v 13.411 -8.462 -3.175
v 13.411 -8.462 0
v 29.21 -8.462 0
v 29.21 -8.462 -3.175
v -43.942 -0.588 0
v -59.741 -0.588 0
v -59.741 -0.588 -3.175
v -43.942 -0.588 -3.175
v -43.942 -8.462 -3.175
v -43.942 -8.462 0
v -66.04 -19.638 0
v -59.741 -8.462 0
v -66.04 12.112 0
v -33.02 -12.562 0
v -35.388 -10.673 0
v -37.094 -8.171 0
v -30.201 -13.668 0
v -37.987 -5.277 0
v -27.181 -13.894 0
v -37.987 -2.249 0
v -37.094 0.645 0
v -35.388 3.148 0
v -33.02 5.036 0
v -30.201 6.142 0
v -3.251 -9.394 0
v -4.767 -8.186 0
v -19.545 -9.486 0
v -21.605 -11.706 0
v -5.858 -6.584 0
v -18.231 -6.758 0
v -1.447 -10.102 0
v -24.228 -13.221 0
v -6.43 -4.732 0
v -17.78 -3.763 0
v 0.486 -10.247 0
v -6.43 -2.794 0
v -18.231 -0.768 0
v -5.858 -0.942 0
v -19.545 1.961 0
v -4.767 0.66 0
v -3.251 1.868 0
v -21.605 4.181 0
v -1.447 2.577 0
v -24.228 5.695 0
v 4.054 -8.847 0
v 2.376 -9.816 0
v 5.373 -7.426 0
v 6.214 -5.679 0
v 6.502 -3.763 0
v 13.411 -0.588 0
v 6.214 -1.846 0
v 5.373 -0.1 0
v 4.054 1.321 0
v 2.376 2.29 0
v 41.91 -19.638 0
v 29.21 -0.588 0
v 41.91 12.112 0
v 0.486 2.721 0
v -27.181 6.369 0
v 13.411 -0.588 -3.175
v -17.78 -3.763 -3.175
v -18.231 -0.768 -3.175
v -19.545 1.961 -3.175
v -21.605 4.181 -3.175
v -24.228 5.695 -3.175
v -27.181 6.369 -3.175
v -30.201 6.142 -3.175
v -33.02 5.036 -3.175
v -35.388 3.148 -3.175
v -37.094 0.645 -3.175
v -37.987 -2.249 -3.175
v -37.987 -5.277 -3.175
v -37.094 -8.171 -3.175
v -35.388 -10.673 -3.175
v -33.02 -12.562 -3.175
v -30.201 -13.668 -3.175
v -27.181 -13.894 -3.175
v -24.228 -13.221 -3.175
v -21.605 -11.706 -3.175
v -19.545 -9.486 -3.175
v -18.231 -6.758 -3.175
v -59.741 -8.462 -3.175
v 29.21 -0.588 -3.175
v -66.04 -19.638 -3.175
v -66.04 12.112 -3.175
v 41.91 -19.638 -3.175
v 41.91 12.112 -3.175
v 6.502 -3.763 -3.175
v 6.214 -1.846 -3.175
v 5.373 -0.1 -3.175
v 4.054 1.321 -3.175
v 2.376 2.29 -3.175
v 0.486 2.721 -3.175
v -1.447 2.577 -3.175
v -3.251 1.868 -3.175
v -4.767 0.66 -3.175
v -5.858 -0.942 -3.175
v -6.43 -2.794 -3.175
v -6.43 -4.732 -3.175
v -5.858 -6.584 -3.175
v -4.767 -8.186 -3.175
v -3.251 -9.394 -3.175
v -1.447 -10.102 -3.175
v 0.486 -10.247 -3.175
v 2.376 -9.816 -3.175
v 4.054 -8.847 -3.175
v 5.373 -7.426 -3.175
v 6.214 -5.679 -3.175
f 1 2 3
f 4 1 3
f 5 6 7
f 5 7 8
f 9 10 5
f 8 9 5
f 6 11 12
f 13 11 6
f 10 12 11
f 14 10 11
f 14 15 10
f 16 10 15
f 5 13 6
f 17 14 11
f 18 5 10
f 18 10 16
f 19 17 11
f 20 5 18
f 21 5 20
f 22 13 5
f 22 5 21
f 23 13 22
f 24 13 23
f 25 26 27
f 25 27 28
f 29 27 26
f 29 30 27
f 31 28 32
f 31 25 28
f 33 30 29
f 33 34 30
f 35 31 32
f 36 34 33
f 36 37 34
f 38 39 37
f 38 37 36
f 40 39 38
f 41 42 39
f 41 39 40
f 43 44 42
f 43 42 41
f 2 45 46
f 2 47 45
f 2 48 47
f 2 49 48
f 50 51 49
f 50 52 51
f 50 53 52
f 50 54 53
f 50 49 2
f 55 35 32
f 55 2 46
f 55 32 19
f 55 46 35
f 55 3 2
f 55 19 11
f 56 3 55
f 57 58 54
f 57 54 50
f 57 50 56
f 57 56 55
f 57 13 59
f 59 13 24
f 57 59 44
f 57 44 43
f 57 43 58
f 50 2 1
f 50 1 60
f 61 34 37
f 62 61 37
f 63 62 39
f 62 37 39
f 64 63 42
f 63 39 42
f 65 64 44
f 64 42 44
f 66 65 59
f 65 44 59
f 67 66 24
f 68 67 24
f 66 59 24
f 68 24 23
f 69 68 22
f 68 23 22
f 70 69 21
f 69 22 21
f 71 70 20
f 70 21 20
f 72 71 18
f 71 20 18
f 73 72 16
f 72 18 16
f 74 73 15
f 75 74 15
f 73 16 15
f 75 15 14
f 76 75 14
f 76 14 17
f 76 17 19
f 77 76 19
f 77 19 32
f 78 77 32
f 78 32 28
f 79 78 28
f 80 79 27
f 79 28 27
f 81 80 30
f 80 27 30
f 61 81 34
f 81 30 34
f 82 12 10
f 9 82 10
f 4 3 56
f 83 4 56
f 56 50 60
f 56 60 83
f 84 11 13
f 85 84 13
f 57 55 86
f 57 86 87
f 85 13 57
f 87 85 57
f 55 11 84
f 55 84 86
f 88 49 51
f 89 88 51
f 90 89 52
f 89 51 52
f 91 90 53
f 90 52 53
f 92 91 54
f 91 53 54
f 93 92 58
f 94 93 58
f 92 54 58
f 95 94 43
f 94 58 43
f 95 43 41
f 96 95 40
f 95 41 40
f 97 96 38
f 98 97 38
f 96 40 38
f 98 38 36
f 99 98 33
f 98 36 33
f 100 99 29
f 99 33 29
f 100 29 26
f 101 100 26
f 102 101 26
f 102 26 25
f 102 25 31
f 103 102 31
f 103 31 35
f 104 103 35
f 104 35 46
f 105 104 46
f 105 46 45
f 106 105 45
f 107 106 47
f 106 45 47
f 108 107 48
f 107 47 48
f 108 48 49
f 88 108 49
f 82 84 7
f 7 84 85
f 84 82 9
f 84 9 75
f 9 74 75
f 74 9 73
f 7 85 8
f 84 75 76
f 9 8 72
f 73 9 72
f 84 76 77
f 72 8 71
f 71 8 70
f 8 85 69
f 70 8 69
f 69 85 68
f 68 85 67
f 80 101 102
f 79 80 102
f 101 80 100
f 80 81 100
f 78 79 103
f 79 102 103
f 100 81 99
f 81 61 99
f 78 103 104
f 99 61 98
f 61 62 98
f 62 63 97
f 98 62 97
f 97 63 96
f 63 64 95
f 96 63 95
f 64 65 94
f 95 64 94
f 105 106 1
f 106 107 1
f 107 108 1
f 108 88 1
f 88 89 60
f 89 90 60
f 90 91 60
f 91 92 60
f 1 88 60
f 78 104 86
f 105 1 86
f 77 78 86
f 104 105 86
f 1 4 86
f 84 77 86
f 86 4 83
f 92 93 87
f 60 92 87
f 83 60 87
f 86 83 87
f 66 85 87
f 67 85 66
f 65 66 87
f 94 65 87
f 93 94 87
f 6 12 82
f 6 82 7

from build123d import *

# Parameters (mm, degrees)
F0_W     = 107.95
F0_H     = 31.75
F0_W_2   = 15.7988
F0_H_2   = 7.874
F0_R     = 10.16
F0_R_2   = 6.5024
F1_DEPTH = 3.175


with BuildPart() as f1:
    # F0 (on Top) → F1 (new body)
    with BuildSketch(Plane.XY):
        with Locations((-12.065, -3.762827)):
            Rectangle(F0_W, F0_H)
        with Locations((-51.8414, -4.524827)):
            Rectangle(F0_W_2, F0_H_2, mode=Mode.SUBTRACT)
        with Locations((-27.94, -3.762827)):
            Circle(F0_R, mode=Mode.SUBTRACT)
        with Locations((21.3106, -4.524827)):
            Rectangle(F0_W_2, F0_H_2, mode=Mode.SUBTRACT)
        with Locations((0, -3.762827)):
            Circle(F0_R_2, mode=Mode.SUBTRACT)
    extrude(amount=-F1_DEPTH)


solid = f1.part
